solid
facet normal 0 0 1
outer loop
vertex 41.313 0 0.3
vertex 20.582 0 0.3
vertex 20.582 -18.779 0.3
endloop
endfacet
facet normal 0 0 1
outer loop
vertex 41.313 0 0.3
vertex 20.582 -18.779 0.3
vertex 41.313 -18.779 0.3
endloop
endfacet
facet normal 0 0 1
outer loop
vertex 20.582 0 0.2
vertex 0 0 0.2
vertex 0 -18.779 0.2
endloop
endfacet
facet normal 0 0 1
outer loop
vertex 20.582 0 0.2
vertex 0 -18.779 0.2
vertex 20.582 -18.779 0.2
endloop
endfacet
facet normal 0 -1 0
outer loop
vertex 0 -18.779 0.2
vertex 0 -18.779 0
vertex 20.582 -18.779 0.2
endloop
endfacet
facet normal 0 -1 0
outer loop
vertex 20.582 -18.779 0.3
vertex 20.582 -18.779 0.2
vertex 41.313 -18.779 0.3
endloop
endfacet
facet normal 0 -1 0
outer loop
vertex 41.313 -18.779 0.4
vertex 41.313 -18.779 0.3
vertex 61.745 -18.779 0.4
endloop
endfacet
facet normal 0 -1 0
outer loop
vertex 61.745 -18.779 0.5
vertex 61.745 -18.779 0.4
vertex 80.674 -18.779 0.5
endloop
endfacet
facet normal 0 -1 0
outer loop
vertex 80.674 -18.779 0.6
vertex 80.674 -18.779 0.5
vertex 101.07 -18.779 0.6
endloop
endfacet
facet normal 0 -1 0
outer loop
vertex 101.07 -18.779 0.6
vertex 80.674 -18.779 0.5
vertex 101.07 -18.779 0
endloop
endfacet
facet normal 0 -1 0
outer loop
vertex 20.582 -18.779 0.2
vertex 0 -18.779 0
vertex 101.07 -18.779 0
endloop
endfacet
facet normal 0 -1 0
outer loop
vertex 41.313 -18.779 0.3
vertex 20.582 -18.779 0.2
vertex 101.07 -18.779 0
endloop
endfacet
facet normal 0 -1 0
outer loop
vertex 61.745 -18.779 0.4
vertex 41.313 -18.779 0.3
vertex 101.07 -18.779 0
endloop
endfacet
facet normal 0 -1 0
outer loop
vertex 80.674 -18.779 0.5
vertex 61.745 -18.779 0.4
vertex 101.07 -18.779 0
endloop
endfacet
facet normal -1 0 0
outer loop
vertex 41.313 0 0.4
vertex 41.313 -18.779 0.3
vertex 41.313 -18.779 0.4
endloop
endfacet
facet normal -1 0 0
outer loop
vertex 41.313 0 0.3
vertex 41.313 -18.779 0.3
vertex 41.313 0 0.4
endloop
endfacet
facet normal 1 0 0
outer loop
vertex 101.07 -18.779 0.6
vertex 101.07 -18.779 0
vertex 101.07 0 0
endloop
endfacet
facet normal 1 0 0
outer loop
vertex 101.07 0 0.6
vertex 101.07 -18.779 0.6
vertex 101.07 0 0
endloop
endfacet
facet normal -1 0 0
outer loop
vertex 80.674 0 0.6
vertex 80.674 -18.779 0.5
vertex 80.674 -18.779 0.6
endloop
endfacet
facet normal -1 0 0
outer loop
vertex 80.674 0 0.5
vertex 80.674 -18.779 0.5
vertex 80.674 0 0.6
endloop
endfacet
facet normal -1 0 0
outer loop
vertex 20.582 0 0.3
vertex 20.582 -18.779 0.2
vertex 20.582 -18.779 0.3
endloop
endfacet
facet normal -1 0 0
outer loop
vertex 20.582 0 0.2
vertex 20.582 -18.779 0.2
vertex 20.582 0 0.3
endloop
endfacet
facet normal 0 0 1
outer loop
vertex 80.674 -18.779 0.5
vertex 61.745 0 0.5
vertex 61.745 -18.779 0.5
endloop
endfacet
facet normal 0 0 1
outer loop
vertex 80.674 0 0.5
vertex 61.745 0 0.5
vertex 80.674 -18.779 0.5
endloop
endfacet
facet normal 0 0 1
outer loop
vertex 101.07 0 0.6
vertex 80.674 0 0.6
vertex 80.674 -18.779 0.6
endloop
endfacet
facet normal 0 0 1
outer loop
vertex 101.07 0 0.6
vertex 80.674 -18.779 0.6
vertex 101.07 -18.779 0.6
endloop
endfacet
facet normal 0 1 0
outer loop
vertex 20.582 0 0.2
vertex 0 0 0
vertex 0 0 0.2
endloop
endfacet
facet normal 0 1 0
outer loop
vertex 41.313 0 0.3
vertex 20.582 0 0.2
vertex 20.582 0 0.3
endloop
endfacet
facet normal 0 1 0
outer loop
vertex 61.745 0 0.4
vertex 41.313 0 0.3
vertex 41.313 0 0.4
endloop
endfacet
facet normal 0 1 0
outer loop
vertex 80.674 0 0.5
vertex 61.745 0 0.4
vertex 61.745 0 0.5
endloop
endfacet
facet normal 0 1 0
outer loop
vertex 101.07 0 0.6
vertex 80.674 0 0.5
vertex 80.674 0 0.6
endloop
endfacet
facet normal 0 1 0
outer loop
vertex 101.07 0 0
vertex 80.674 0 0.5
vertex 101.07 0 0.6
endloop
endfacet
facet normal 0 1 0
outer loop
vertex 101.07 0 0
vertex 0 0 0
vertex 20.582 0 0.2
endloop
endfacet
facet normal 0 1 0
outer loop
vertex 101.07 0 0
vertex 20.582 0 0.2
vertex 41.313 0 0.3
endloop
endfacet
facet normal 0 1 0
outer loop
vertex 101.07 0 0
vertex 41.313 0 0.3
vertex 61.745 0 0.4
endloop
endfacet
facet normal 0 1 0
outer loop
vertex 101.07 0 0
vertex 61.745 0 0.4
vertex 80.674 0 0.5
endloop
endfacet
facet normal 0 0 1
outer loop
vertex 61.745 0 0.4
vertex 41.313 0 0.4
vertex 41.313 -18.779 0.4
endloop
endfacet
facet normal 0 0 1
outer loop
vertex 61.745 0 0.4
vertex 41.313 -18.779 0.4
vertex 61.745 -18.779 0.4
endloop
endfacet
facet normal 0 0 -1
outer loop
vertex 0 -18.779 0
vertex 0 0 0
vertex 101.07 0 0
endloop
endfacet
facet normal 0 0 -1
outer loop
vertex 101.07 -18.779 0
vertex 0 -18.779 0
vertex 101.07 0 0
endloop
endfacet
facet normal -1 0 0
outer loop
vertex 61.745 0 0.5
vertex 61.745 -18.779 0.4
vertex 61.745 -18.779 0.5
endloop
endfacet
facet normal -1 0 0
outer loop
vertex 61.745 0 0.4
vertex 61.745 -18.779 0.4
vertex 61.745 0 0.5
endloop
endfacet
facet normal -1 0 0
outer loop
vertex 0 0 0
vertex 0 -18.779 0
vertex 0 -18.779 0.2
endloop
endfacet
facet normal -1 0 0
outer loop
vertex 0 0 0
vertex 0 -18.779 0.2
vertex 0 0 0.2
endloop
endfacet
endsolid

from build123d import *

# Parameters (mm, degrees)
F0_W     = 20.581514
F0_H     = 18.778749
F1_DEPTH = 0.2
F0_W_2   = 20.731736
F2_DEPTH = 0.3
F0_W_3   = 20.43128
F3_DEPTH = 0.4
F0_W_4   = 18.928978
F4_DEPTH = 0.5
F0_W_5   = 20.396158
F5_DEPTH = 0.6


with BuildPart() as f1:
    # F0 (on Top) → F1 (new body)
    with BuildSketch(Plane.XY):
        with Locations((10.290757, -9.389374)):
            Rectangle(F0_W, F0_H)
    extrude(amount=F1_DEPTH)

    # F0 (on Top) → F2 (join)
    with BuildSketch(Plane.XY):
        with Locations((30.947382, -9.389374)):
            Rectangle(F0_W_2, F0_H)
    extrude(amount=F2_DEPTH)

    # F0 (on Top) → F3 (join)
    with BuildSketch(Plane.XY):
        with Locations((51.52889, -9.389374)):
            Rectangle(F0_W_3, F0_H)
    extrude(amount=F3_DEPTH)

    # F0 (on Top) → F4 (join)
    with BuildSketch(Plane.XY):
        with Locations((71.209019, -9.389374)):
            Rectangle(F0_W_4, F0_H)
    extrude(amount=F4_DEPTH)

    # F0 (on Top) → F5 (join)
    with BuildSketch(Plane.XY):
        with Locations((90.871587, -9.389374)):
            Rectangle(F0_W_5, F0_H)
    extrude(amount=F5_DEPTH)


solid = f1.part
